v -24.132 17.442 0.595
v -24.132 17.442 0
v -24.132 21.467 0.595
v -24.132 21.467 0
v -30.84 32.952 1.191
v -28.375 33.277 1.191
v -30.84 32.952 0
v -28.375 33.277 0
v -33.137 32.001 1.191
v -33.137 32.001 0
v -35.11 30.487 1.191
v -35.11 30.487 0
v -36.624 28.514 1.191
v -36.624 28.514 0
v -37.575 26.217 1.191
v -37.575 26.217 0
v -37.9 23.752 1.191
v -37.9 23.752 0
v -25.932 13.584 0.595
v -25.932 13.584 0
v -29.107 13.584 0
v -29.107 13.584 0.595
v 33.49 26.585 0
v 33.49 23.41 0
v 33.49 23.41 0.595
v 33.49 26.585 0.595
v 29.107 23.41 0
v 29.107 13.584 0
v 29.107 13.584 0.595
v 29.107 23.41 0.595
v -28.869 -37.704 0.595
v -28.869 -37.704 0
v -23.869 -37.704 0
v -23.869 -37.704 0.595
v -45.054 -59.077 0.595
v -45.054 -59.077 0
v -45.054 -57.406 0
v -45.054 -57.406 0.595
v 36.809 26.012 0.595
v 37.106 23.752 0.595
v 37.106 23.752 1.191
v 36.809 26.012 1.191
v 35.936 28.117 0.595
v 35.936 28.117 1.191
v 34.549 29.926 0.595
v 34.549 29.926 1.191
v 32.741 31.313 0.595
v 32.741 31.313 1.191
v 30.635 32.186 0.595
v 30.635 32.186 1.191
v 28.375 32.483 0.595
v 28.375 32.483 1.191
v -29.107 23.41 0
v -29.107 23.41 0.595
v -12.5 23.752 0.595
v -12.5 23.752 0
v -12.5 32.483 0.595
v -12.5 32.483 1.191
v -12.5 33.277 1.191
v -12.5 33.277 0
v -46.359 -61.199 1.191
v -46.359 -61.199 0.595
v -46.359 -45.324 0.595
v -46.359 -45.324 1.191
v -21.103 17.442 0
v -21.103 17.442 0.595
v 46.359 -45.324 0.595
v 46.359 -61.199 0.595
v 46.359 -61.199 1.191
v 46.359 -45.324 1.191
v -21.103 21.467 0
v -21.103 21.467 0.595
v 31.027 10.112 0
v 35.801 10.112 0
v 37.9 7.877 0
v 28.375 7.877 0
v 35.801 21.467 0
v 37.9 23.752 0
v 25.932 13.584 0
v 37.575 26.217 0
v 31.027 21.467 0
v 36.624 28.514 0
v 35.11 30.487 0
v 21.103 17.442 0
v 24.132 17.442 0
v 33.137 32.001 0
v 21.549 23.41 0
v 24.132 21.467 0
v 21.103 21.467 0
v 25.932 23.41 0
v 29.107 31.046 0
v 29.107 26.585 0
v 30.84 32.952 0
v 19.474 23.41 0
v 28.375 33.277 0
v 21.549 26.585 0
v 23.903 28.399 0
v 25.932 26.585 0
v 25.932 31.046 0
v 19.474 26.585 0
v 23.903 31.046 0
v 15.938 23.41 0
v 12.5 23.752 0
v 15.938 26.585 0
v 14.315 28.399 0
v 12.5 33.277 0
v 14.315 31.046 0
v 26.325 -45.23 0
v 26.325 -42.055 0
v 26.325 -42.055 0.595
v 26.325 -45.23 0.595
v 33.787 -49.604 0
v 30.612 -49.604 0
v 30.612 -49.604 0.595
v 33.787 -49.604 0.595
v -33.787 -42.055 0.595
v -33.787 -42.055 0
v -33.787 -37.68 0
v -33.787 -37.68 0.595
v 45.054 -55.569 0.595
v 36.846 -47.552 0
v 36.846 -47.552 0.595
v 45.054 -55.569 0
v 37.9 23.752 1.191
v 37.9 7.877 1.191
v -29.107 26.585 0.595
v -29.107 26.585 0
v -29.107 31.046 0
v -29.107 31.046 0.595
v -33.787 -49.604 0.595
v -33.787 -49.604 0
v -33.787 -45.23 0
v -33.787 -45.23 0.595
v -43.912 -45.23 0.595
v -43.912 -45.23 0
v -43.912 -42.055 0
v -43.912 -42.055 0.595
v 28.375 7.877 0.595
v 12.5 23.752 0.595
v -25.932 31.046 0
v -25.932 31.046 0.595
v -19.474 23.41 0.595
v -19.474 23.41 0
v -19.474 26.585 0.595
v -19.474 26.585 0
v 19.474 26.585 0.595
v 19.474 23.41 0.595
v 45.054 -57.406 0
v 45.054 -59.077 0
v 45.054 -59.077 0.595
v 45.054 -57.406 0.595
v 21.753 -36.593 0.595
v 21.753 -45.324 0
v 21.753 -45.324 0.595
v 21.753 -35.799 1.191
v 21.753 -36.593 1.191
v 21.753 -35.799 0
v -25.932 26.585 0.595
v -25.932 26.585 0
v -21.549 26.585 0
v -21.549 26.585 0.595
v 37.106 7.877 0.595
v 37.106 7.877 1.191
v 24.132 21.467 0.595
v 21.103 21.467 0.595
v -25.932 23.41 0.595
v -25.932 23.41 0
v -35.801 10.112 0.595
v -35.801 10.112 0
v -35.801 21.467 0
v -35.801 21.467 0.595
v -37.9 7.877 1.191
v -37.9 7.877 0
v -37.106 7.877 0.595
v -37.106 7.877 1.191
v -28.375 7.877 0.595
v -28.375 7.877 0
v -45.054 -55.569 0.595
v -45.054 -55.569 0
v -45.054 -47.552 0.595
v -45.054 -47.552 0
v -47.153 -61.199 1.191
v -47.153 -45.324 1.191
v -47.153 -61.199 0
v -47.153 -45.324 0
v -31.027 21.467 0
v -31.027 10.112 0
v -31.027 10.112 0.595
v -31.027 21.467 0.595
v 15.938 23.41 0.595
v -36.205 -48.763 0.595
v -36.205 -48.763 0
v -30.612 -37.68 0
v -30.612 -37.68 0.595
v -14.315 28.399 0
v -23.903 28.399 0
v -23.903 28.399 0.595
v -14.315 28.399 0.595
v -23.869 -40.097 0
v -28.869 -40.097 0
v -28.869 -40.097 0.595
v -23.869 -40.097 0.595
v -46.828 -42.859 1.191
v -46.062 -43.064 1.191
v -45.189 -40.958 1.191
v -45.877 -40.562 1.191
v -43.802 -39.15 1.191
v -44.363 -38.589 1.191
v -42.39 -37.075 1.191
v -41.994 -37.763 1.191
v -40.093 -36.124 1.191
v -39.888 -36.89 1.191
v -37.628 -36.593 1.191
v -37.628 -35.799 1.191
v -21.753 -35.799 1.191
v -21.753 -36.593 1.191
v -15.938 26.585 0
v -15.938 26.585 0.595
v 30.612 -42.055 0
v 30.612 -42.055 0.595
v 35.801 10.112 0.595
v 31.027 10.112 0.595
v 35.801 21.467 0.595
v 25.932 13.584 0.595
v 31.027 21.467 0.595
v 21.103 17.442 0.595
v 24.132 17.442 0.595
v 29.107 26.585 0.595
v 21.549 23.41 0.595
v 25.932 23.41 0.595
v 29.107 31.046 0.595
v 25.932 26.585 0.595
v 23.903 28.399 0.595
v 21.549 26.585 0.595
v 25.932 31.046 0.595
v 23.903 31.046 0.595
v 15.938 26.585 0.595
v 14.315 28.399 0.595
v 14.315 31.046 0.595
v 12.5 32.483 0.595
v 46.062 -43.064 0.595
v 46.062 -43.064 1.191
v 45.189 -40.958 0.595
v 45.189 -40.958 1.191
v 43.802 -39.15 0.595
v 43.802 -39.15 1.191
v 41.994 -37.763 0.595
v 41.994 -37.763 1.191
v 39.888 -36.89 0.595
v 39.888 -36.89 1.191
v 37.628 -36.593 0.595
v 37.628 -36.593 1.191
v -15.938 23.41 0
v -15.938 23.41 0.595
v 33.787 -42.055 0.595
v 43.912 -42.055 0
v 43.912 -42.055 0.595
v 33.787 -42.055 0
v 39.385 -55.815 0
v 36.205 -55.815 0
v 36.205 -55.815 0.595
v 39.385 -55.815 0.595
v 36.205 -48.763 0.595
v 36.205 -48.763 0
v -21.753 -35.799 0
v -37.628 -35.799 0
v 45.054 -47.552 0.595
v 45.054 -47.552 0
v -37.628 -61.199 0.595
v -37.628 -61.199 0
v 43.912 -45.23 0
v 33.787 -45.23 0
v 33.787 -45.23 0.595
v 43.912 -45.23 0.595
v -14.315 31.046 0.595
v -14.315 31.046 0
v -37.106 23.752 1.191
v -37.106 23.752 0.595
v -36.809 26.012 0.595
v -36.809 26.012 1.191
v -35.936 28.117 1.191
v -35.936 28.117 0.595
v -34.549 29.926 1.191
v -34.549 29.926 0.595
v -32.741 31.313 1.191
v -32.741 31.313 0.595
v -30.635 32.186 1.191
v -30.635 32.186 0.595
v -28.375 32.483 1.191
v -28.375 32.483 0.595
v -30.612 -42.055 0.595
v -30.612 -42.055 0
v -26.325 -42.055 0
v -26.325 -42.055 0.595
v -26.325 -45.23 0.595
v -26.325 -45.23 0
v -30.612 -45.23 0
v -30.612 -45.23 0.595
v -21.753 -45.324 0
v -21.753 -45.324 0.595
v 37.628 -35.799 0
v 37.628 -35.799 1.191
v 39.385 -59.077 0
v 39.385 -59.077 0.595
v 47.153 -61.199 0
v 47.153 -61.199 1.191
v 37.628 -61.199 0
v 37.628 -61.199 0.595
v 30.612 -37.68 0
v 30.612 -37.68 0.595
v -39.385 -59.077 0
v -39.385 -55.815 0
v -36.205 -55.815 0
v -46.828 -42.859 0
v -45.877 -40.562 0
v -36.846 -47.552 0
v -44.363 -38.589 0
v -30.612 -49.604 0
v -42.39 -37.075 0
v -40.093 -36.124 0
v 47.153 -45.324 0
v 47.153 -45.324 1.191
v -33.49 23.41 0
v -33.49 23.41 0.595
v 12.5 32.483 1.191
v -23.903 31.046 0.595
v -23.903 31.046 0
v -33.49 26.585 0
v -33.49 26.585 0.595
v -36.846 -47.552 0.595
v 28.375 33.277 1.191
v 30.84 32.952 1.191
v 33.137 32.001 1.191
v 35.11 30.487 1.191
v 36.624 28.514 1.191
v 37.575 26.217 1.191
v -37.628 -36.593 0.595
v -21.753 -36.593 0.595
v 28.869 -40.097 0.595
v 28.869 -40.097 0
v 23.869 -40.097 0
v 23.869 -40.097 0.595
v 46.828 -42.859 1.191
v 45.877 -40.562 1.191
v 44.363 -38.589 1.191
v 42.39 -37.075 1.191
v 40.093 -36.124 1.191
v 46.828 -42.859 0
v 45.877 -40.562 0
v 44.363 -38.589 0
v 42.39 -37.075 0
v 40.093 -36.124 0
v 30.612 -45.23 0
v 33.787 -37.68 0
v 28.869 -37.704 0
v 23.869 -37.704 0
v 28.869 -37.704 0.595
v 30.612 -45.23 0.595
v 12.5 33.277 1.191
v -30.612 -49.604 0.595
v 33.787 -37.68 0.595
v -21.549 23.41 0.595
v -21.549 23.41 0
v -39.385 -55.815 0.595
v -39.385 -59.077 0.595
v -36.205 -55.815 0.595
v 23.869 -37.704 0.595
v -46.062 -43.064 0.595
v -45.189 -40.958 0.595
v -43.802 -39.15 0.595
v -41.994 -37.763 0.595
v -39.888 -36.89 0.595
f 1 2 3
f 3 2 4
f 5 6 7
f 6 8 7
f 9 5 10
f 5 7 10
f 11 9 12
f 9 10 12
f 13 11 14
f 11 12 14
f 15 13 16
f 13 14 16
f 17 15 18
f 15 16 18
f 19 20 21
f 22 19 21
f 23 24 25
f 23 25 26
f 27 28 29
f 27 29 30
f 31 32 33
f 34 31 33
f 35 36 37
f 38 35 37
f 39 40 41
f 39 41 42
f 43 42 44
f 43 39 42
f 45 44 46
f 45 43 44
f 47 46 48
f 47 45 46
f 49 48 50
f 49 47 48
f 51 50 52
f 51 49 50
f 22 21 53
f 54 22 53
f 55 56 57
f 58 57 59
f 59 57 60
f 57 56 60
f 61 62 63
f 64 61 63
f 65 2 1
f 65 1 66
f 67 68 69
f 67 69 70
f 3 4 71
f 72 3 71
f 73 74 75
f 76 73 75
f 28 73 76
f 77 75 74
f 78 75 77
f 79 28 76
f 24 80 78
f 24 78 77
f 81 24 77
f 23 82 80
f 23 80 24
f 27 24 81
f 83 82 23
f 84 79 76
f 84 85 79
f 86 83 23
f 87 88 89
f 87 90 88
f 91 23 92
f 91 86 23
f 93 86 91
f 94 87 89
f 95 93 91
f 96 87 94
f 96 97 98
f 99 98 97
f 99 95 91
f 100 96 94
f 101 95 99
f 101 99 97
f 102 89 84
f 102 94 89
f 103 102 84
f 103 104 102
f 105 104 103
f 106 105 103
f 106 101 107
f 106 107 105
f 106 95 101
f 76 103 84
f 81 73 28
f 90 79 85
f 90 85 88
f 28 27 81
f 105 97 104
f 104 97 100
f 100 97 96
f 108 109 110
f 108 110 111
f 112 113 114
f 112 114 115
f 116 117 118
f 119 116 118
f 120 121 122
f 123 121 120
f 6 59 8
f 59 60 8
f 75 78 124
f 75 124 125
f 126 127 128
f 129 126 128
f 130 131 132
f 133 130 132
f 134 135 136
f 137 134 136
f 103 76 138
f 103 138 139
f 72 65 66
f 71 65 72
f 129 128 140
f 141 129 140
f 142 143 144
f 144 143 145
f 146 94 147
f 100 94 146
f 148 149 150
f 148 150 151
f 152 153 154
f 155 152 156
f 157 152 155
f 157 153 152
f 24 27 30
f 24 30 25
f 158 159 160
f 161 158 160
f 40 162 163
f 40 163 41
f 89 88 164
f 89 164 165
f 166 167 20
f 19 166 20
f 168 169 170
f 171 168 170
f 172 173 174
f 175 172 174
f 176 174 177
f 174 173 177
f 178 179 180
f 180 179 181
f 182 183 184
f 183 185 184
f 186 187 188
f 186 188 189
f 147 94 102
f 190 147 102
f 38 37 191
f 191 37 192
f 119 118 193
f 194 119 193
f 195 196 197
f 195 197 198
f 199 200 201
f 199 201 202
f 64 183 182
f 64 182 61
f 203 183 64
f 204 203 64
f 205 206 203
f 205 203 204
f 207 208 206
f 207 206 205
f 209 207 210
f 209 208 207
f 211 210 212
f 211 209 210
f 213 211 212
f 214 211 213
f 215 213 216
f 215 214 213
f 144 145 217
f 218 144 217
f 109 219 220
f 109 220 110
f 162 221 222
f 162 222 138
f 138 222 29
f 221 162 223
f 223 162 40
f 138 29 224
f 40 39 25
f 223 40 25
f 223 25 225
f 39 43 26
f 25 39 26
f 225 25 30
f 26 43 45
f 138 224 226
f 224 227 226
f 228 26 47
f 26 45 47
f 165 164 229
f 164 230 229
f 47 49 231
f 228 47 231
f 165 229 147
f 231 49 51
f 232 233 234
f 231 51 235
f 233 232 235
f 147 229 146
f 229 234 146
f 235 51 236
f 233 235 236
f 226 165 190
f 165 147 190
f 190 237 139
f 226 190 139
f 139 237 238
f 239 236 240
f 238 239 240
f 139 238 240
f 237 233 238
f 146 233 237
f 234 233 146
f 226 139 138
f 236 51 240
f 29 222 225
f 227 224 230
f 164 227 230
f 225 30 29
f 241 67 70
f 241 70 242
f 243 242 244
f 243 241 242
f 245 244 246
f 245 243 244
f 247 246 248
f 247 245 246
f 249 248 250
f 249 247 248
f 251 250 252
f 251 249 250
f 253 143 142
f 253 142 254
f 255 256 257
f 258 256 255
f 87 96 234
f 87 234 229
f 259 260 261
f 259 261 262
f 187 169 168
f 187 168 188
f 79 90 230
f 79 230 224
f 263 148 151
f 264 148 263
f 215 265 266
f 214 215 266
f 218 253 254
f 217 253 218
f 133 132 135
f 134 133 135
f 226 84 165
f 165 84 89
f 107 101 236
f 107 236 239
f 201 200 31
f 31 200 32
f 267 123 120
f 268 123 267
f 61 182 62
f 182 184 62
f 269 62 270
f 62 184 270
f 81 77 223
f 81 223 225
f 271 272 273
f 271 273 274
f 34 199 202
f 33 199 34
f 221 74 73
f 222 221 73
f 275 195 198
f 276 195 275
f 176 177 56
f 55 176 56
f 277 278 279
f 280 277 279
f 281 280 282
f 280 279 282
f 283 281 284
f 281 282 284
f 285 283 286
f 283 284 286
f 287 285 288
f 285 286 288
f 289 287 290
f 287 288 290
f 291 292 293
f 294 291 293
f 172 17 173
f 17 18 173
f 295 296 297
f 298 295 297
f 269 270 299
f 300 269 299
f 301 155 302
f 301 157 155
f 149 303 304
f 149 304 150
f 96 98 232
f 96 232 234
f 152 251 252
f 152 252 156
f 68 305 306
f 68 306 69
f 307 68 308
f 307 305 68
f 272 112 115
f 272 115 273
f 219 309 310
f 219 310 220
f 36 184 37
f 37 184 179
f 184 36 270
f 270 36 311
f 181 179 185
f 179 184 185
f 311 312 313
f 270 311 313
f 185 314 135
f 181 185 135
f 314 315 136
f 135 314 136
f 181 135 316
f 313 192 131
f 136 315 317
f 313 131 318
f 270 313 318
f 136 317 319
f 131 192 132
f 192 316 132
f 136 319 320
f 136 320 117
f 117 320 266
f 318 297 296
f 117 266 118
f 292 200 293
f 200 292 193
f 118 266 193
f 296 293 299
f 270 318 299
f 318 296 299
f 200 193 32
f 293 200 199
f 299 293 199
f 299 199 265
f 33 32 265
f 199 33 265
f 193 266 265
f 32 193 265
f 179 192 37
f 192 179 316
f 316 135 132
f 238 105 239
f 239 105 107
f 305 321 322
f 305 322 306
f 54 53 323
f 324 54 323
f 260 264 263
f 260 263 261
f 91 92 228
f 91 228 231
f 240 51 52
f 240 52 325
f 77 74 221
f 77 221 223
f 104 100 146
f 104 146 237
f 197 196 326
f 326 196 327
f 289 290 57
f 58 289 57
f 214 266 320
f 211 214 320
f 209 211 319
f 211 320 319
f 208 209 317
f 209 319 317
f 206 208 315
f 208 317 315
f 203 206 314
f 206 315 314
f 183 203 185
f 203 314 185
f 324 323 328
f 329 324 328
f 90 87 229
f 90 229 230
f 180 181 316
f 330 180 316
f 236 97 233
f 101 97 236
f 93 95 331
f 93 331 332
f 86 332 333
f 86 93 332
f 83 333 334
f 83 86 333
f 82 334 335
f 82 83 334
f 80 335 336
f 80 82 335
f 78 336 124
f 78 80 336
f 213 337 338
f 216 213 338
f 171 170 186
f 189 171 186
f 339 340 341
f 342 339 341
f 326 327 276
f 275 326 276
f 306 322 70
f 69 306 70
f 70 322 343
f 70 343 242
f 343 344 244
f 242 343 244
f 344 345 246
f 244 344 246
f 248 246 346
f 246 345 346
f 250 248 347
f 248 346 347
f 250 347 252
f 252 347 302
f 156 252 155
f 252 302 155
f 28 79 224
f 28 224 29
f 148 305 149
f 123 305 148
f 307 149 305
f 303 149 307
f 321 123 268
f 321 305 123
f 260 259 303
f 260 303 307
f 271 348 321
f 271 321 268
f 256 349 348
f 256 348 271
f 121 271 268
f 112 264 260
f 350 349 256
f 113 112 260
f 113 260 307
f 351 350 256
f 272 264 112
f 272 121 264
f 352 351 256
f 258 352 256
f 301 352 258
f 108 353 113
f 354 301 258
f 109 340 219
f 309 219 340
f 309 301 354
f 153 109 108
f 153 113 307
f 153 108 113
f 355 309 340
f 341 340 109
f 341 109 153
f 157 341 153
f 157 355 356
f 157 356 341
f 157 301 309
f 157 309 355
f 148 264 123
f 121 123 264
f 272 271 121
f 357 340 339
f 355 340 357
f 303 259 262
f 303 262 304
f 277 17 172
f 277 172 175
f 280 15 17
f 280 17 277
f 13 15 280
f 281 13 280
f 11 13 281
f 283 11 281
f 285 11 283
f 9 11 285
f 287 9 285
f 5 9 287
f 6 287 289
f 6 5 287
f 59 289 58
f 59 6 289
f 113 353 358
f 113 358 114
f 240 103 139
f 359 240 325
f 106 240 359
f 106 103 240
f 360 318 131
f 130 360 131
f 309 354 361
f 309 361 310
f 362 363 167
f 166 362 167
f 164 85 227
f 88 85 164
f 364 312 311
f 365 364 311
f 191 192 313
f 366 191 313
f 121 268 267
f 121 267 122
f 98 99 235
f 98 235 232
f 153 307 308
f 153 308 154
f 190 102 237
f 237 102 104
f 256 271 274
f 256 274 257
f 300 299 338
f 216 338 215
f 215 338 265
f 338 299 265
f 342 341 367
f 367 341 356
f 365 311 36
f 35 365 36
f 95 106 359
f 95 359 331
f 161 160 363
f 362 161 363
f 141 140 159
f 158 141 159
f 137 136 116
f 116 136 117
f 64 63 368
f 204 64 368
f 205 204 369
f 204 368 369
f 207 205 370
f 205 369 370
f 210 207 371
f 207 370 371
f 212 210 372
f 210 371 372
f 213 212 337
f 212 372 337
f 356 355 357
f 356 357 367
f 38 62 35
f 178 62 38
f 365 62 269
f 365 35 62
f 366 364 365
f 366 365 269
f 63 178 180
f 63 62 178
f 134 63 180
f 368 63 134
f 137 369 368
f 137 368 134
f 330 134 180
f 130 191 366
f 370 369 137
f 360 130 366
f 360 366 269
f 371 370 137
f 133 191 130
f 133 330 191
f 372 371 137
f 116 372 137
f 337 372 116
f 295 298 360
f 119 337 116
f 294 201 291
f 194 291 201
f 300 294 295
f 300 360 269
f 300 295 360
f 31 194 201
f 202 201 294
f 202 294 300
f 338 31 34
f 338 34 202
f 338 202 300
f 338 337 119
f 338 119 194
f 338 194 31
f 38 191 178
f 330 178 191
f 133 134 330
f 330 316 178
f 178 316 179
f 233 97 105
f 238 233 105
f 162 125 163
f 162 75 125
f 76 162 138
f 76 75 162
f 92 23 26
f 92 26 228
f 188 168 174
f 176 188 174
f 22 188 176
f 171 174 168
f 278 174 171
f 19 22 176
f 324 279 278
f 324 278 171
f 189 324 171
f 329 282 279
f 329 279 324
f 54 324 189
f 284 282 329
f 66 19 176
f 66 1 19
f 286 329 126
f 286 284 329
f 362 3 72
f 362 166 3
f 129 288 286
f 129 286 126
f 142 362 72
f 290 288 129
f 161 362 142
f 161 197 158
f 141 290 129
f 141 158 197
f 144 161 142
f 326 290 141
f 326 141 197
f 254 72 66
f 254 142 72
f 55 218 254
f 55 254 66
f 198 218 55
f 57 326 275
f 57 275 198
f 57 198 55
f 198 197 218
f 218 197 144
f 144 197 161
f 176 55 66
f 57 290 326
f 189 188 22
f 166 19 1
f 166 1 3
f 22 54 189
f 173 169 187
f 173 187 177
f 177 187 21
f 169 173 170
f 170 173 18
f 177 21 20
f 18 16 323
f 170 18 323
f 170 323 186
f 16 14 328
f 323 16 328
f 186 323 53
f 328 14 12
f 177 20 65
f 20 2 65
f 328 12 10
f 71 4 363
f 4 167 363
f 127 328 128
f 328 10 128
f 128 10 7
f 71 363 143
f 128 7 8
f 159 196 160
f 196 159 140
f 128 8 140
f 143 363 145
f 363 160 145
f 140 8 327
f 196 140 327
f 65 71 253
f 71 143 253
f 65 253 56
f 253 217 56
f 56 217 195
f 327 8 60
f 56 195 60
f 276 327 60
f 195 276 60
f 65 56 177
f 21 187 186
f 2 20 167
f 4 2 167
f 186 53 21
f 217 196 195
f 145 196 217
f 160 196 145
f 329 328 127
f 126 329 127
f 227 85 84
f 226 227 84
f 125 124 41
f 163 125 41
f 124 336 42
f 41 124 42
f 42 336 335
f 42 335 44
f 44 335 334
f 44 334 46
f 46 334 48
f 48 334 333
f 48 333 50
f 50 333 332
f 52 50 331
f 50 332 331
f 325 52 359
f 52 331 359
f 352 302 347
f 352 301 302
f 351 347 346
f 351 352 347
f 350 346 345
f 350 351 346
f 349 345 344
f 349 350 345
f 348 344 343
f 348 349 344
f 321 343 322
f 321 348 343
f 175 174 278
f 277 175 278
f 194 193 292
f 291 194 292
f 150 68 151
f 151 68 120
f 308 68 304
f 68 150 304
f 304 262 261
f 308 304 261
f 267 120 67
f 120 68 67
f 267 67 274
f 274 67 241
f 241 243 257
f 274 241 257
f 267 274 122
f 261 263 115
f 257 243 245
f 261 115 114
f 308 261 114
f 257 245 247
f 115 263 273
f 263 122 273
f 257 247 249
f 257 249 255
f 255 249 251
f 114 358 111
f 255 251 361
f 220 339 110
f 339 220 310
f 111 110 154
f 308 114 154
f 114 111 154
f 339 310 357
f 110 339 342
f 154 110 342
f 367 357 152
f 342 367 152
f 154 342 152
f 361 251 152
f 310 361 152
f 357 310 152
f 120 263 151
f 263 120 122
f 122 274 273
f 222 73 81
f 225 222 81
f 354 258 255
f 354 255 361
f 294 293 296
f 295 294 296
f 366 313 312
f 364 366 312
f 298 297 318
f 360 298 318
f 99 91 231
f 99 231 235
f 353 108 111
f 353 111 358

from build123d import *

# Parameters (mm, degrees)
F0_W      = 4.7741434537
F0_H      = 11.3548277877
F0_W_2    = 3.029467538
F0_H_2    = 4.0243016556
F0_W_3    = 3.5360120237
F0_H_3    = 3.175
F0_W_4    = 9.5876548439
F0_H_4    = 2.6476947606
F1_DEPTH  = 0.5953125
F3_W      = 5.000397563
F3_H      = 2.3930110037
F4_DEPTH  = 0.5953125
F7_DEPTH  = 0.5953125
F10_DEPTH = 0.5953125


with BuildPart() as f1:
    # F0 (on Top) → F1 (new body)
    with BuildSketch(Plane.XY):
        with BuildLine():
            Line((-37.8999099401, 23.7517624235), (-37.8999099401, 7.8767624235))
            Line((-37.8999099401, 7.8767624235), (-28.3749099401, 7.8767624235))
            Line((-28.3749099401, 7.8767624235), (-12.4999099401, 23.7517624235))
            Line((-12.4999099401, 23.7517624235), (-12.4999099401, 33.2767624235))
            Line((-12.4999099401, 33.2767624235), (-28.3749099401, 33.2767624235))
            ThreePointArc((-28.3749099401, 33.2767624235), (-35.1101020309, 30.4869545143), (-37.8999099401, 23.7517624235))
        make_face()
        with Locations((-33.4143128712, 15.7890960108)):
            Rectangle(F0_W, F0_H, mode=Mode.SUBTRACT)
        with Locations((-22.6173051633, 19.4543590769)):
            Rectangle(F0_W_2, F0_H_2, mode=Mode.SUBTRACT)
        Polygon((-29.1072471009, 31.0463342831), (-27.5197471009, 31.0463342831), (-25.9322471009, 31.0463342831), (-25.9322471009, 26.5851784881), (-21.5492131154, 26.5851784881), (-21.5492131154, 23.4101784881), (-25.9322471009, 23.4101784881), (-25.9322471009, 13.5838342831), (-27.5197471009, 13.5838342831), (-29.1072471009, 13.5838342831), (-29.1072471009, 23.4101784881), (-33.4902810864, 23.4101784881), (-33.4902810864, 26.5851784881), (-29.1072471009, 26.5851784881), align=None, mode=Mode.SUBTRACT)
        with Locations((-17.7058172412, 24.9976784881)):
            Rectangle(F0_W_3, F0_H_3, mode=Mode.SUBTRACT)
        with Locations((-19.1090297885, 29.7224869028)):
            Rectangle(F0_W_4, F0_H_4, mode=Mode.SUBTRACT)
    extrude(amount=F1_DEPTH)


with BuildPart() as f2_1:
    # F2: instance of F1
    add(f1.part.mirror(Plane.YZ))

    # F8: F1 across plane


with BuildPart() as f4:
    # F3 (on Top) → F4 (new body)
    with BuildSketch(Plane.XY):
        with BuildLine():
            Line((-47.1529566733, -45.3240452789), (-47.1529566733, -61.1990452789))
            Line((-47.1529566733, -61.1990452789), (-37.6279566733, -61.1990452789))
            Line((-37.6279566733, -61.1990452789), (-21.7529566733, -45.3240452789))
            Line((-21.7529566733, -45.3240452789), (-21.7529566733, -35.7990452789))
            Line((-21.7529566733, -35.7990452789), (-37.6279566733, -35.7990452789))
            ThreePointArc((-37.6279566733, -35.7990452789), (-44.3631487641, -38.5888531881), (-47.1529566733, -45.3240452789))
        make_face()
        Polygon((-45.0544313312, -47.5520975888), (-36.8459821744, -47.5520975888), (-45.0544313312, -55.5688444664), align=None, mode=Mode.SUBTRACT)
        Polygon((-36.2051948905, -48.7631298602), (-36.2051948905, -55.8149367571), (-39.3846184015, -55.8149367571), (-39.3846184015, -59.0765923262), (-45.0544313312, -59.0765923262), (-45.0544313312, -57.405698907), align=None, mode=Mode.SUBTRACT)
        Polygon((-26.324653998, -42.054524374), (-26.324653998, -43.272908777), (-26.324653998, -45.229524374), (-30.611936003, -45.229524374), (-30.611936003, -49.6035590768), (-33.786936003, -49.6035590768), (-33.786936003, -45.229524374), (-43.9120419323, -45.229524374), (-43.9120419323, -42.054524374), (-33.786936003, -42.054524374), (-33.786936003, -37.6804896712), (-30.611936003, -37.6804896712), (-30.611936003, -42.054524374), align=None, mode=Mode.SUBTRACT)
        with Locations((-26.3687595725, -38.9008168131)):
            Rectangle(F3_W, F3_H, mode=Mode.SUBTRACT)
    extrude(amount=F4_DEPTH)


with BuildPart() as f5_1:
    # F5: instance of F4
    add(f4.part.mirror(Plane.YZ))

    # F11: F4 across plane


with BuildPart() as f1_1:
    add(f1.part)

    # F6 (on face) → F7 (join)
    with BuildSketch(Plane.XY.offset(0.5953125)):
        with BuildLine():
            ThreePointArc((-37.1061599401, 23.7517624235), (-34.5488360233, 29.9256885068), (-28.3749099401, 32.4830124235))
            Line((-28.3749099401, 32.4830124235), (-12.4999099401, 32.4830124235))
            Line((-12.4999099401, 32.4830124235), (-12.4999099401, 33.2767624235))
            Line((-12.4999099401, 33.2767624235), (-28.3749099401, 33.2767624235))
            ThreePointArc((-28.3749099401, 33.2767624235), (-35.1101020309, 30.4869545143), (-37.8999099401, 23.7517624235))
            Line((-37.8999099401, 23.7517624235), (-37.8999099401, 7.8767624235))
            Line((-37.8999099401, 7.8767624235), (-37.1061599401, 7.8767624235))
            Line((-37.1061599401, 7.8767624235), (-37.1061599401, 23.7517624235))
        make_face()
    extrude(amount=F7_DEPTH)


with BuildPart() as f2_1_1:
    add(f2_1.part)
    add(f1_1.part.mirror(Plane.YZ))


with BuildPart() as f4_1:
    add(f4.part)

    # F9 (on face) → F10 (join)
    with BuildSketch(Plane.XY.offset(0.5953125)):
        with BuildLine():
            ThreePointArc((-37.6279566733, -35.7990452789), (-44.3631487641, -38.5888531881), (-47.1529566733, -45.3240452789))
            Line((-47.1529566733, -45.3240452789), (-47.1529566733, -61.1990452789))
            Line((-47.1529566733, -61.1990452789), (-46.3592066733, -61.1990452789))
            Line((-46.3592066733, -61.1990452789), (-46.3592066733, -45.3240452789))
            ThreePointArc((-46.3592066733, -45.3240452789), (-43.8018827565, -39.1501191957), (-37.6279566733, -36.5927952789))
            Line((-37.6279566733, -36.5927952789), (-21.7529566733, -36.5927952789))
            Line((-21.7529566733, -36.5927952789), (-21.7529566733, -35.7990452789))
            Line((-21.7529566733, -35.7990452789), (-37.6279566733, -35.7990452789))
        make_face()
    extrude(amount=F10_DEPTH)


with BuildPart() as f5_1_1:
    add(f5_1.part)
    add(f4_1.part.mirror(Plane.YZ))


solid = Compound([f1_1.part, f2_1_1.part, f4_1.part, f5_1_1.part])
